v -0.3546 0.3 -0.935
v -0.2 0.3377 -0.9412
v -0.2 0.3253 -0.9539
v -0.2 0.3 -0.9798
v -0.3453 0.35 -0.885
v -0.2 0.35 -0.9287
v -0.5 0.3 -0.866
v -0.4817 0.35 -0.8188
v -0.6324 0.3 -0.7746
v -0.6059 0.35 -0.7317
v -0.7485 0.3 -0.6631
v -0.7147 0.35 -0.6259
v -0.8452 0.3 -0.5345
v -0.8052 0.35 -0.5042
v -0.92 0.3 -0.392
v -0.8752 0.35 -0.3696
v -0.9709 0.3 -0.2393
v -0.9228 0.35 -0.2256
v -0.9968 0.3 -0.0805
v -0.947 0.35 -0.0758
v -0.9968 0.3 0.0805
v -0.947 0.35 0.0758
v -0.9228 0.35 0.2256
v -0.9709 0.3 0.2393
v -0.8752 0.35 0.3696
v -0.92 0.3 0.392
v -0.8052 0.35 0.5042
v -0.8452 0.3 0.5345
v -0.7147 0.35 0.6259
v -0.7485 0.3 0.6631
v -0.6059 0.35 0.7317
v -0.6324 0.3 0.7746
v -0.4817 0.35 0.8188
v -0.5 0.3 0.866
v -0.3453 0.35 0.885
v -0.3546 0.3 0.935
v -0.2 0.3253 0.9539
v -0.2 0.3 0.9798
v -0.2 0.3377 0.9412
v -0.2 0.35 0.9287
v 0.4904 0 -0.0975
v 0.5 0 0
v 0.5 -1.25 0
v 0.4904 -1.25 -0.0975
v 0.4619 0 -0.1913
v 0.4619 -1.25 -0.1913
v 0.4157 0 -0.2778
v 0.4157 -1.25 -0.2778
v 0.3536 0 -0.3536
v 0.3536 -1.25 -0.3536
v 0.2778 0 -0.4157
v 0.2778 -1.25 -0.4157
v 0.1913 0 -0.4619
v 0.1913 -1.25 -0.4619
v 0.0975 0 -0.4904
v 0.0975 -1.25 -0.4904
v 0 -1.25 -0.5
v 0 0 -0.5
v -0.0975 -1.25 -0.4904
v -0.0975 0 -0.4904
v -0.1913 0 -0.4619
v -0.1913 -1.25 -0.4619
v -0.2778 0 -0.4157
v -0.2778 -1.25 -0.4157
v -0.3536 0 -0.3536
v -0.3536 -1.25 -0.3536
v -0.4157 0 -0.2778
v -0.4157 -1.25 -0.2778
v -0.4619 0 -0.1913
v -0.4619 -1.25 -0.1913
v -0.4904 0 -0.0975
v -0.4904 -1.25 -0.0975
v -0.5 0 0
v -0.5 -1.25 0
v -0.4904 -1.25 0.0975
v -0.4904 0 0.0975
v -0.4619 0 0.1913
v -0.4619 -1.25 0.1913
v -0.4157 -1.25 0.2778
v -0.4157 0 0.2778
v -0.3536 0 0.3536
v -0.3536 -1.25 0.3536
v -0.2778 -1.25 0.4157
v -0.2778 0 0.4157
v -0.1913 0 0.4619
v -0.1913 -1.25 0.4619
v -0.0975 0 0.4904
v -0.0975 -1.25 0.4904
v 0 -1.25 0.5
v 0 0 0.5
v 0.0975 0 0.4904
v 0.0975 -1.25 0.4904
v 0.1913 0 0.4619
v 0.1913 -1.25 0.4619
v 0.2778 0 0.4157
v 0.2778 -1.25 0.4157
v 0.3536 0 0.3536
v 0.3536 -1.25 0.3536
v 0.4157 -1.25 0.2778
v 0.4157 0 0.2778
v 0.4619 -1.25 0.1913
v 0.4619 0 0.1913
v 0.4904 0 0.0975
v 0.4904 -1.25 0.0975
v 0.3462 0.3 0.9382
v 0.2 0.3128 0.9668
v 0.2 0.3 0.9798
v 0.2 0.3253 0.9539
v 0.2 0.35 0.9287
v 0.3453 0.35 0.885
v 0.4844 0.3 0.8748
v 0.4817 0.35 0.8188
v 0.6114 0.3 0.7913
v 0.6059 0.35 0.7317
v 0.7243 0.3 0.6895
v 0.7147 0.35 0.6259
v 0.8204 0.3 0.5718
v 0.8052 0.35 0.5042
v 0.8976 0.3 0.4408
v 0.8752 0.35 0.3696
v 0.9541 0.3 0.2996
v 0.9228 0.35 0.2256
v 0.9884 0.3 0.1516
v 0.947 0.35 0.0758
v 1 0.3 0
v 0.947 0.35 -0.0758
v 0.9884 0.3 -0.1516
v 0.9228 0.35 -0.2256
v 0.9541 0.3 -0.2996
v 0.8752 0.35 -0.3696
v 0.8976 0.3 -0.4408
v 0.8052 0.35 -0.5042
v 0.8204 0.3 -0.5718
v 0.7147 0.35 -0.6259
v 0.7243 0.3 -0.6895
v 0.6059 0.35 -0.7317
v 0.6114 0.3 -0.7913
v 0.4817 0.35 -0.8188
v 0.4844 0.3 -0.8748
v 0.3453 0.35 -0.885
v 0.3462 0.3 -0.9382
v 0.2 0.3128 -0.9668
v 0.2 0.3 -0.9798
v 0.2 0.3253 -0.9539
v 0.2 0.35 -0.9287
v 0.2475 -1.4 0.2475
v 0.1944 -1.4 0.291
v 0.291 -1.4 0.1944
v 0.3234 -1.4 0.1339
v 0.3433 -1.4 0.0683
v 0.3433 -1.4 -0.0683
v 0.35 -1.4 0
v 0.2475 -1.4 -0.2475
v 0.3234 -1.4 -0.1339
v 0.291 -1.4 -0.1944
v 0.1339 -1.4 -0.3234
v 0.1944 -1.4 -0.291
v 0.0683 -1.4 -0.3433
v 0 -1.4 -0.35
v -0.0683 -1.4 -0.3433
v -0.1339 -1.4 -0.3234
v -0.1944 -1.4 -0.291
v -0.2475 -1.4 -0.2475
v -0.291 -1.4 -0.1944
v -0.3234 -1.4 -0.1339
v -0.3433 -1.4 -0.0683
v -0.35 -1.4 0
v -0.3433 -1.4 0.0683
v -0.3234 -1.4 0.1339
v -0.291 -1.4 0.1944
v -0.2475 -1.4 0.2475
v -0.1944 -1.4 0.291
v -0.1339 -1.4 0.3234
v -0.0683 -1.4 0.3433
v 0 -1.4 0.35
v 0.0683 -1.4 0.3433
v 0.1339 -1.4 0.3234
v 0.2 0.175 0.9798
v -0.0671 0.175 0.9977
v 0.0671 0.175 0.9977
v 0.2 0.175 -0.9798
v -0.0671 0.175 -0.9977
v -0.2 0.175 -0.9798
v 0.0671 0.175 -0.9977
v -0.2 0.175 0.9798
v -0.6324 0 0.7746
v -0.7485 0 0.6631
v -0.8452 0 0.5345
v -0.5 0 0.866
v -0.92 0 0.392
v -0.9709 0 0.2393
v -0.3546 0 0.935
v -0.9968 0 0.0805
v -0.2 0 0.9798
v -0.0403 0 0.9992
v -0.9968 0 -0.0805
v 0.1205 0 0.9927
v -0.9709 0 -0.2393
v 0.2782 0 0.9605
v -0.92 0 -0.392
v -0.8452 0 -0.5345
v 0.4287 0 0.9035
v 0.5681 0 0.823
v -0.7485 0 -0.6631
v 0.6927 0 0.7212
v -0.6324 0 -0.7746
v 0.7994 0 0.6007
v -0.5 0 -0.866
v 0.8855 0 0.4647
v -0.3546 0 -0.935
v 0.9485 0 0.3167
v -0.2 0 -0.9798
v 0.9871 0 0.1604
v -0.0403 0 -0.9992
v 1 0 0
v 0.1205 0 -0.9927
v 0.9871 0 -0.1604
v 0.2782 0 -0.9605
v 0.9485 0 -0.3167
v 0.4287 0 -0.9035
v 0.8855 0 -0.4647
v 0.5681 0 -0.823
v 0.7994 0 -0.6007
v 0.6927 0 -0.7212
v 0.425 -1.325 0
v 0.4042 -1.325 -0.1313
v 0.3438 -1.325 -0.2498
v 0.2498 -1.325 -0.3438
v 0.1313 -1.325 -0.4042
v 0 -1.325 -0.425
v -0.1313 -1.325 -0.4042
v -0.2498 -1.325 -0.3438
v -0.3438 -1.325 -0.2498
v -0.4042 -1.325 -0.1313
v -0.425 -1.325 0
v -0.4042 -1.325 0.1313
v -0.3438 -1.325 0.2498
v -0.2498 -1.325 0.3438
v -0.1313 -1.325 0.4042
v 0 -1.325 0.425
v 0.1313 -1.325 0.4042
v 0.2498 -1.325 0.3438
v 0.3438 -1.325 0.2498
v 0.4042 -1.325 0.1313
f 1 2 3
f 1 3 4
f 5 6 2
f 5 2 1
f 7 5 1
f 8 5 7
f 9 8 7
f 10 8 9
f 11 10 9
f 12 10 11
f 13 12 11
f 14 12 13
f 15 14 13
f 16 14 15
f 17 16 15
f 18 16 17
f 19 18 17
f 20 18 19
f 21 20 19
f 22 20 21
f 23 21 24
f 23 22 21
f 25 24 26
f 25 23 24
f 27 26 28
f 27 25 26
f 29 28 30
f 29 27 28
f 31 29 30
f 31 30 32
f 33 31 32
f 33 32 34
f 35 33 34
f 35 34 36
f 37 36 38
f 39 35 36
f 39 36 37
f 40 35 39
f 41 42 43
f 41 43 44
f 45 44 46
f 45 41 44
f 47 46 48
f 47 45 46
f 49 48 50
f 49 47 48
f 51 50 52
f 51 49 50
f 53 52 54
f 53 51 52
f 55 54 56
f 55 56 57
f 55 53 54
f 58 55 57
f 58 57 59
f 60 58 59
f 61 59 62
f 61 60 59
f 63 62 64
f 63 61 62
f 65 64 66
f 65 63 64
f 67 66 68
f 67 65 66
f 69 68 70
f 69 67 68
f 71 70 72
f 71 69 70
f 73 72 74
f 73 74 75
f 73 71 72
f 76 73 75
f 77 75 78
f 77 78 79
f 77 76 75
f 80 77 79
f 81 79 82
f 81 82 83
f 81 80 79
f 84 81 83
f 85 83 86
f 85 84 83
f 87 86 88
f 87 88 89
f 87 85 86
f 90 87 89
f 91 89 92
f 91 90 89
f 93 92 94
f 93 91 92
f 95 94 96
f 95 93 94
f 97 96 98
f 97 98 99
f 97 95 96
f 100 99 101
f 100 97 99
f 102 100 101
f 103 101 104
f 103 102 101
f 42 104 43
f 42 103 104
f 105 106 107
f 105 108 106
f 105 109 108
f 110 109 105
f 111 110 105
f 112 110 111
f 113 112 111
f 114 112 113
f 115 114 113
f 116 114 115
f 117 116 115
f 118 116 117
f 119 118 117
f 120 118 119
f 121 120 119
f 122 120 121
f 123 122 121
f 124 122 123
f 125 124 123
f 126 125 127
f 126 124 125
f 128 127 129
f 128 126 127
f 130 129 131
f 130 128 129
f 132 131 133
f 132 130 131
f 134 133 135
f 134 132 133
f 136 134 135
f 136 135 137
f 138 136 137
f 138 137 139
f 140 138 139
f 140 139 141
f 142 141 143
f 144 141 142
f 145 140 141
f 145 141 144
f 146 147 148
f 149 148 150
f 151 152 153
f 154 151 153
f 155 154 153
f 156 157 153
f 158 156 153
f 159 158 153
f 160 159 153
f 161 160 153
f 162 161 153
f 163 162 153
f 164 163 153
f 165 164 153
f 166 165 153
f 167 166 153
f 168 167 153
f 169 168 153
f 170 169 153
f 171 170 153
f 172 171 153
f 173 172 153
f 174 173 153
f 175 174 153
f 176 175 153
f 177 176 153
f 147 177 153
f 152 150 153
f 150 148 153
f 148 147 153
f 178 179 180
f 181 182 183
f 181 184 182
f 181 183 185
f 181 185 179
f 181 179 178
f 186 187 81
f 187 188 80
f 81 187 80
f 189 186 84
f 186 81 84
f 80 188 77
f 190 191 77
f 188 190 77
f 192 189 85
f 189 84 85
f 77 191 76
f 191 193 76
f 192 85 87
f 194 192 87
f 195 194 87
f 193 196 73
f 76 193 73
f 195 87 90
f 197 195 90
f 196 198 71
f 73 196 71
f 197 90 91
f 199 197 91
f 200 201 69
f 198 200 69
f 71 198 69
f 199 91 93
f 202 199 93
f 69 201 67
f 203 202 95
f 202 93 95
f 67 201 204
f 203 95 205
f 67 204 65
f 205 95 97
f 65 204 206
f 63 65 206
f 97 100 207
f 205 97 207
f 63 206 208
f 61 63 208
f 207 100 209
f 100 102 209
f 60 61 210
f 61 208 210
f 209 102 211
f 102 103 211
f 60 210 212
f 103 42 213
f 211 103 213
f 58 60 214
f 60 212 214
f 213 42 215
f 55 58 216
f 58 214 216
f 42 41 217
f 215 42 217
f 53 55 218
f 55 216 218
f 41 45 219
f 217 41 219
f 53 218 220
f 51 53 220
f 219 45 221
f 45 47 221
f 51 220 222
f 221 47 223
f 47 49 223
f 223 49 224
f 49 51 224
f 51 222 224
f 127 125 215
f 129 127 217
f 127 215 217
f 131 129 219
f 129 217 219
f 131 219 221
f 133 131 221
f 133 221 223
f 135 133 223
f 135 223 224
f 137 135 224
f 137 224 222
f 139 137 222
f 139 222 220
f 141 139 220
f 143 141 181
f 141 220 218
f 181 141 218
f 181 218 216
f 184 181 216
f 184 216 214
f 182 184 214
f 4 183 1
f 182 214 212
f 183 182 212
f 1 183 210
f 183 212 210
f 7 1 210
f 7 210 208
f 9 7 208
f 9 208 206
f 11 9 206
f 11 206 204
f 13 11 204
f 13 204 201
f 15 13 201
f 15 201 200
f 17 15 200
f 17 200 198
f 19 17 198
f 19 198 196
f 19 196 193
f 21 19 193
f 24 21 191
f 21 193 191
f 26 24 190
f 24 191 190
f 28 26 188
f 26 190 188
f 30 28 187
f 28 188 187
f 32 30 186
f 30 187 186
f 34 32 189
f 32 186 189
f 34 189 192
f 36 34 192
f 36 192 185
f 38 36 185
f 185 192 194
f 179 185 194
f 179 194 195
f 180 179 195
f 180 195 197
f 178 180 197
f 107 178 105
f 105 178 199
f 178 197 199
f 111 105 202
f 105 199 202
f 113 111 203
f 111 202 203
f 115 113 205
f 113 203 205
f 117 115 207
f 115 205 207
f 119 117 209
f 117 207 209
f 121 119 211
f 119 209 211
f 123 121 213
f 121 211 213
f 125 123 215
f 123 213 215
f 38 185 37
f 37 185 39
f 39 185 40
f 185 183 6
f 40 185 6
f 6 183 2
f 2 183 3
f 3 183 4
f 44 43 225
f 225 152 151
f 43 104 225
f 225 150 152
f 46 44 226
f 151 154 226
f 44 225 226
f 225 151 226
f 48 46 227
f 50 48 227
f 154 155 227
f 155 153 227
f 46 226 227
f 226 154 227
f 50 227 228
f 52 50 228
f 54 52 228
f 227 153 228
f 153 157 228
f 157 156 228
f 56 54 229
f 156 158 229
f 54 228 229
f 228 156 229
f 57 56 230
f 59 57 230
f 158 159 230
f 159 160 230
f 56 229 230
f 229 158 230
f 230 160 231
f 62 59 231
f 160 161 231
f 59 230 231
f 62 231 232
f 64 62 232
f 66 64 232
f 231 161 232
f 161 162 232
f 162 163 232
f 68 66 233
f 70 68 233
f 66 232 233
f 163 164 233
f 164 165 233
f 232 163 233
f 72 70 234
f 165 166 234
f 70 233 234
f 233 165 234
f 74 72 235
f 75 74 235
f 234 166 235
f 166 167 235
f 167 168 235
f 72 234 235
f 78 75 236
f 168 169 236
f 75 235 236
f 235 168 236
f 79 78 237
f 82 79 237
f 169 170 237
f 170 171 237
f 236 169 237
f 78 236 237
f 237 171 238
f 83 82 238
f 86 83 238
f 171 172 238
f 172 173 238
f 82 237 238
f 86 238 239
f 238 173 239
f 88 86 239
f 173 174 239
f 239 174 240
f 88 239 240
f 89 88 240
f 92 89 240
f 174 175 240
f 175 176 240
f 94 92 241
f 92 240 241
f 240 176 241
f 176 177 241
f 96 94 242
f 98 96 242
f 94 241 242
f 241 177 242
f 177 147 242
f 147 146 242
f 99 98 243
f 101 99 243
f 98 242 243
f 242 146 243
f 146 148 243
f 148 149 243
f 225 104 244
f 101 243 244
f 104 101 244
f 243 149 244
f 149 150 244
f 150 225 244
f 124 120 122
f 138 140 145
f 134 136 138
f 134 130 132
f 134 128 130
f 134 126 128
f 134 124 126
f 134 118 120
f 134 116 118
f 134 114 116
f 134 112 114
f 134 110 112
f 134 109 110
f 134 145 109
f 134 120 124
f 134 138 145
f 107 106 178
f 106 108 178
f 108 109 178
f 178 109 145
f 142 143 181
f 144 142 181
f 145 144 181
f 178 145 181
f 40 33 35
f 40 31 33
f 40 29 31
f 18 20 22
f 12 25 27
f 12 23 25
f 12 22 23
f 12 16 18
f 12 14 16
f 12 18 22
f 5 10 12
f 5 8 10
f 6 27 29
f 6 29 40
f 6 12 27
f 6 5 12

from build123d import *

# Parameters (mm, degrees)
SKETCH1_R               = 1
BOSS_EXTRUDE1_DEPTH     = 0.35
SKETCH2_R               = 0.5
BOSS_EXTRUDE2_DEPTH     = 1.4
CHAMFER1_SIZE           = 0.05
CHAMFER2_SIZE           = 0.15
CUT_EXTRUDE1_DEPTH      = 2
CUT_EXTRUDE1_DEPTH_BACK = 2


with BuildPart() as part:
    # Sketch1 → Boss-Extrude1 (new body)
    with BuildSketch(Plane(origin=(0, 0, 0), x_dir=(1, 0, 0), z_dir=(0, 1, 0))):
        Circle(SKETCH1_R)
    extrude(amount=BOSS_EXTRUDE1_DEPTH)

    # Sketch2 → Boss-Extrude2 (add)
    with BuildSketch(Plane(origin=(0, 0, 0), x_dir=(1, 0, 0), z_dir=(0, 1, 0))):
        Circle(SKETCH2_R)
    extrude(amount=-BOSS_EXTRUDE2_DEPTH)

    # Chamfer1
    chamfer1_edges = [part.edges().sort_by_distance(p)[0] for p in [
        (-1, 0.35, 0),
    ]]
    chamfer(chamfer1_edges, length=CHAMFER1_SIZE)

    # Chamfer2
    chamfer2_edges = [part.edges().sort_by_distance(p)[0] for p in [
        (-0.5, -1.4, 0),
    ]]
    chamfer(chamfer2_edges, length=CHAMFER2_SIZE)

    # Sketch3 → Cut-Extrude1 (cut, two sides)
    with BuildSketch(Plane.XY) as cut_extrude1_sk:
        Polygon((-0.2, 0.35), (0, 0.35), (0.2, 0.35), (0.2, 0.175), (0, 0.175), (-0.2, 0.175), align=None)
    extrude(amount=CUT_EXTRUDE1_DEPTH, mode=Mode.SUBTRACT)
    extrude(cut_extrude1_sk.sketch, amount=-CUT_EXTRUDE1_DEPTH_BACK, mode=Mode.SUBTRACT)


solid = part.part
